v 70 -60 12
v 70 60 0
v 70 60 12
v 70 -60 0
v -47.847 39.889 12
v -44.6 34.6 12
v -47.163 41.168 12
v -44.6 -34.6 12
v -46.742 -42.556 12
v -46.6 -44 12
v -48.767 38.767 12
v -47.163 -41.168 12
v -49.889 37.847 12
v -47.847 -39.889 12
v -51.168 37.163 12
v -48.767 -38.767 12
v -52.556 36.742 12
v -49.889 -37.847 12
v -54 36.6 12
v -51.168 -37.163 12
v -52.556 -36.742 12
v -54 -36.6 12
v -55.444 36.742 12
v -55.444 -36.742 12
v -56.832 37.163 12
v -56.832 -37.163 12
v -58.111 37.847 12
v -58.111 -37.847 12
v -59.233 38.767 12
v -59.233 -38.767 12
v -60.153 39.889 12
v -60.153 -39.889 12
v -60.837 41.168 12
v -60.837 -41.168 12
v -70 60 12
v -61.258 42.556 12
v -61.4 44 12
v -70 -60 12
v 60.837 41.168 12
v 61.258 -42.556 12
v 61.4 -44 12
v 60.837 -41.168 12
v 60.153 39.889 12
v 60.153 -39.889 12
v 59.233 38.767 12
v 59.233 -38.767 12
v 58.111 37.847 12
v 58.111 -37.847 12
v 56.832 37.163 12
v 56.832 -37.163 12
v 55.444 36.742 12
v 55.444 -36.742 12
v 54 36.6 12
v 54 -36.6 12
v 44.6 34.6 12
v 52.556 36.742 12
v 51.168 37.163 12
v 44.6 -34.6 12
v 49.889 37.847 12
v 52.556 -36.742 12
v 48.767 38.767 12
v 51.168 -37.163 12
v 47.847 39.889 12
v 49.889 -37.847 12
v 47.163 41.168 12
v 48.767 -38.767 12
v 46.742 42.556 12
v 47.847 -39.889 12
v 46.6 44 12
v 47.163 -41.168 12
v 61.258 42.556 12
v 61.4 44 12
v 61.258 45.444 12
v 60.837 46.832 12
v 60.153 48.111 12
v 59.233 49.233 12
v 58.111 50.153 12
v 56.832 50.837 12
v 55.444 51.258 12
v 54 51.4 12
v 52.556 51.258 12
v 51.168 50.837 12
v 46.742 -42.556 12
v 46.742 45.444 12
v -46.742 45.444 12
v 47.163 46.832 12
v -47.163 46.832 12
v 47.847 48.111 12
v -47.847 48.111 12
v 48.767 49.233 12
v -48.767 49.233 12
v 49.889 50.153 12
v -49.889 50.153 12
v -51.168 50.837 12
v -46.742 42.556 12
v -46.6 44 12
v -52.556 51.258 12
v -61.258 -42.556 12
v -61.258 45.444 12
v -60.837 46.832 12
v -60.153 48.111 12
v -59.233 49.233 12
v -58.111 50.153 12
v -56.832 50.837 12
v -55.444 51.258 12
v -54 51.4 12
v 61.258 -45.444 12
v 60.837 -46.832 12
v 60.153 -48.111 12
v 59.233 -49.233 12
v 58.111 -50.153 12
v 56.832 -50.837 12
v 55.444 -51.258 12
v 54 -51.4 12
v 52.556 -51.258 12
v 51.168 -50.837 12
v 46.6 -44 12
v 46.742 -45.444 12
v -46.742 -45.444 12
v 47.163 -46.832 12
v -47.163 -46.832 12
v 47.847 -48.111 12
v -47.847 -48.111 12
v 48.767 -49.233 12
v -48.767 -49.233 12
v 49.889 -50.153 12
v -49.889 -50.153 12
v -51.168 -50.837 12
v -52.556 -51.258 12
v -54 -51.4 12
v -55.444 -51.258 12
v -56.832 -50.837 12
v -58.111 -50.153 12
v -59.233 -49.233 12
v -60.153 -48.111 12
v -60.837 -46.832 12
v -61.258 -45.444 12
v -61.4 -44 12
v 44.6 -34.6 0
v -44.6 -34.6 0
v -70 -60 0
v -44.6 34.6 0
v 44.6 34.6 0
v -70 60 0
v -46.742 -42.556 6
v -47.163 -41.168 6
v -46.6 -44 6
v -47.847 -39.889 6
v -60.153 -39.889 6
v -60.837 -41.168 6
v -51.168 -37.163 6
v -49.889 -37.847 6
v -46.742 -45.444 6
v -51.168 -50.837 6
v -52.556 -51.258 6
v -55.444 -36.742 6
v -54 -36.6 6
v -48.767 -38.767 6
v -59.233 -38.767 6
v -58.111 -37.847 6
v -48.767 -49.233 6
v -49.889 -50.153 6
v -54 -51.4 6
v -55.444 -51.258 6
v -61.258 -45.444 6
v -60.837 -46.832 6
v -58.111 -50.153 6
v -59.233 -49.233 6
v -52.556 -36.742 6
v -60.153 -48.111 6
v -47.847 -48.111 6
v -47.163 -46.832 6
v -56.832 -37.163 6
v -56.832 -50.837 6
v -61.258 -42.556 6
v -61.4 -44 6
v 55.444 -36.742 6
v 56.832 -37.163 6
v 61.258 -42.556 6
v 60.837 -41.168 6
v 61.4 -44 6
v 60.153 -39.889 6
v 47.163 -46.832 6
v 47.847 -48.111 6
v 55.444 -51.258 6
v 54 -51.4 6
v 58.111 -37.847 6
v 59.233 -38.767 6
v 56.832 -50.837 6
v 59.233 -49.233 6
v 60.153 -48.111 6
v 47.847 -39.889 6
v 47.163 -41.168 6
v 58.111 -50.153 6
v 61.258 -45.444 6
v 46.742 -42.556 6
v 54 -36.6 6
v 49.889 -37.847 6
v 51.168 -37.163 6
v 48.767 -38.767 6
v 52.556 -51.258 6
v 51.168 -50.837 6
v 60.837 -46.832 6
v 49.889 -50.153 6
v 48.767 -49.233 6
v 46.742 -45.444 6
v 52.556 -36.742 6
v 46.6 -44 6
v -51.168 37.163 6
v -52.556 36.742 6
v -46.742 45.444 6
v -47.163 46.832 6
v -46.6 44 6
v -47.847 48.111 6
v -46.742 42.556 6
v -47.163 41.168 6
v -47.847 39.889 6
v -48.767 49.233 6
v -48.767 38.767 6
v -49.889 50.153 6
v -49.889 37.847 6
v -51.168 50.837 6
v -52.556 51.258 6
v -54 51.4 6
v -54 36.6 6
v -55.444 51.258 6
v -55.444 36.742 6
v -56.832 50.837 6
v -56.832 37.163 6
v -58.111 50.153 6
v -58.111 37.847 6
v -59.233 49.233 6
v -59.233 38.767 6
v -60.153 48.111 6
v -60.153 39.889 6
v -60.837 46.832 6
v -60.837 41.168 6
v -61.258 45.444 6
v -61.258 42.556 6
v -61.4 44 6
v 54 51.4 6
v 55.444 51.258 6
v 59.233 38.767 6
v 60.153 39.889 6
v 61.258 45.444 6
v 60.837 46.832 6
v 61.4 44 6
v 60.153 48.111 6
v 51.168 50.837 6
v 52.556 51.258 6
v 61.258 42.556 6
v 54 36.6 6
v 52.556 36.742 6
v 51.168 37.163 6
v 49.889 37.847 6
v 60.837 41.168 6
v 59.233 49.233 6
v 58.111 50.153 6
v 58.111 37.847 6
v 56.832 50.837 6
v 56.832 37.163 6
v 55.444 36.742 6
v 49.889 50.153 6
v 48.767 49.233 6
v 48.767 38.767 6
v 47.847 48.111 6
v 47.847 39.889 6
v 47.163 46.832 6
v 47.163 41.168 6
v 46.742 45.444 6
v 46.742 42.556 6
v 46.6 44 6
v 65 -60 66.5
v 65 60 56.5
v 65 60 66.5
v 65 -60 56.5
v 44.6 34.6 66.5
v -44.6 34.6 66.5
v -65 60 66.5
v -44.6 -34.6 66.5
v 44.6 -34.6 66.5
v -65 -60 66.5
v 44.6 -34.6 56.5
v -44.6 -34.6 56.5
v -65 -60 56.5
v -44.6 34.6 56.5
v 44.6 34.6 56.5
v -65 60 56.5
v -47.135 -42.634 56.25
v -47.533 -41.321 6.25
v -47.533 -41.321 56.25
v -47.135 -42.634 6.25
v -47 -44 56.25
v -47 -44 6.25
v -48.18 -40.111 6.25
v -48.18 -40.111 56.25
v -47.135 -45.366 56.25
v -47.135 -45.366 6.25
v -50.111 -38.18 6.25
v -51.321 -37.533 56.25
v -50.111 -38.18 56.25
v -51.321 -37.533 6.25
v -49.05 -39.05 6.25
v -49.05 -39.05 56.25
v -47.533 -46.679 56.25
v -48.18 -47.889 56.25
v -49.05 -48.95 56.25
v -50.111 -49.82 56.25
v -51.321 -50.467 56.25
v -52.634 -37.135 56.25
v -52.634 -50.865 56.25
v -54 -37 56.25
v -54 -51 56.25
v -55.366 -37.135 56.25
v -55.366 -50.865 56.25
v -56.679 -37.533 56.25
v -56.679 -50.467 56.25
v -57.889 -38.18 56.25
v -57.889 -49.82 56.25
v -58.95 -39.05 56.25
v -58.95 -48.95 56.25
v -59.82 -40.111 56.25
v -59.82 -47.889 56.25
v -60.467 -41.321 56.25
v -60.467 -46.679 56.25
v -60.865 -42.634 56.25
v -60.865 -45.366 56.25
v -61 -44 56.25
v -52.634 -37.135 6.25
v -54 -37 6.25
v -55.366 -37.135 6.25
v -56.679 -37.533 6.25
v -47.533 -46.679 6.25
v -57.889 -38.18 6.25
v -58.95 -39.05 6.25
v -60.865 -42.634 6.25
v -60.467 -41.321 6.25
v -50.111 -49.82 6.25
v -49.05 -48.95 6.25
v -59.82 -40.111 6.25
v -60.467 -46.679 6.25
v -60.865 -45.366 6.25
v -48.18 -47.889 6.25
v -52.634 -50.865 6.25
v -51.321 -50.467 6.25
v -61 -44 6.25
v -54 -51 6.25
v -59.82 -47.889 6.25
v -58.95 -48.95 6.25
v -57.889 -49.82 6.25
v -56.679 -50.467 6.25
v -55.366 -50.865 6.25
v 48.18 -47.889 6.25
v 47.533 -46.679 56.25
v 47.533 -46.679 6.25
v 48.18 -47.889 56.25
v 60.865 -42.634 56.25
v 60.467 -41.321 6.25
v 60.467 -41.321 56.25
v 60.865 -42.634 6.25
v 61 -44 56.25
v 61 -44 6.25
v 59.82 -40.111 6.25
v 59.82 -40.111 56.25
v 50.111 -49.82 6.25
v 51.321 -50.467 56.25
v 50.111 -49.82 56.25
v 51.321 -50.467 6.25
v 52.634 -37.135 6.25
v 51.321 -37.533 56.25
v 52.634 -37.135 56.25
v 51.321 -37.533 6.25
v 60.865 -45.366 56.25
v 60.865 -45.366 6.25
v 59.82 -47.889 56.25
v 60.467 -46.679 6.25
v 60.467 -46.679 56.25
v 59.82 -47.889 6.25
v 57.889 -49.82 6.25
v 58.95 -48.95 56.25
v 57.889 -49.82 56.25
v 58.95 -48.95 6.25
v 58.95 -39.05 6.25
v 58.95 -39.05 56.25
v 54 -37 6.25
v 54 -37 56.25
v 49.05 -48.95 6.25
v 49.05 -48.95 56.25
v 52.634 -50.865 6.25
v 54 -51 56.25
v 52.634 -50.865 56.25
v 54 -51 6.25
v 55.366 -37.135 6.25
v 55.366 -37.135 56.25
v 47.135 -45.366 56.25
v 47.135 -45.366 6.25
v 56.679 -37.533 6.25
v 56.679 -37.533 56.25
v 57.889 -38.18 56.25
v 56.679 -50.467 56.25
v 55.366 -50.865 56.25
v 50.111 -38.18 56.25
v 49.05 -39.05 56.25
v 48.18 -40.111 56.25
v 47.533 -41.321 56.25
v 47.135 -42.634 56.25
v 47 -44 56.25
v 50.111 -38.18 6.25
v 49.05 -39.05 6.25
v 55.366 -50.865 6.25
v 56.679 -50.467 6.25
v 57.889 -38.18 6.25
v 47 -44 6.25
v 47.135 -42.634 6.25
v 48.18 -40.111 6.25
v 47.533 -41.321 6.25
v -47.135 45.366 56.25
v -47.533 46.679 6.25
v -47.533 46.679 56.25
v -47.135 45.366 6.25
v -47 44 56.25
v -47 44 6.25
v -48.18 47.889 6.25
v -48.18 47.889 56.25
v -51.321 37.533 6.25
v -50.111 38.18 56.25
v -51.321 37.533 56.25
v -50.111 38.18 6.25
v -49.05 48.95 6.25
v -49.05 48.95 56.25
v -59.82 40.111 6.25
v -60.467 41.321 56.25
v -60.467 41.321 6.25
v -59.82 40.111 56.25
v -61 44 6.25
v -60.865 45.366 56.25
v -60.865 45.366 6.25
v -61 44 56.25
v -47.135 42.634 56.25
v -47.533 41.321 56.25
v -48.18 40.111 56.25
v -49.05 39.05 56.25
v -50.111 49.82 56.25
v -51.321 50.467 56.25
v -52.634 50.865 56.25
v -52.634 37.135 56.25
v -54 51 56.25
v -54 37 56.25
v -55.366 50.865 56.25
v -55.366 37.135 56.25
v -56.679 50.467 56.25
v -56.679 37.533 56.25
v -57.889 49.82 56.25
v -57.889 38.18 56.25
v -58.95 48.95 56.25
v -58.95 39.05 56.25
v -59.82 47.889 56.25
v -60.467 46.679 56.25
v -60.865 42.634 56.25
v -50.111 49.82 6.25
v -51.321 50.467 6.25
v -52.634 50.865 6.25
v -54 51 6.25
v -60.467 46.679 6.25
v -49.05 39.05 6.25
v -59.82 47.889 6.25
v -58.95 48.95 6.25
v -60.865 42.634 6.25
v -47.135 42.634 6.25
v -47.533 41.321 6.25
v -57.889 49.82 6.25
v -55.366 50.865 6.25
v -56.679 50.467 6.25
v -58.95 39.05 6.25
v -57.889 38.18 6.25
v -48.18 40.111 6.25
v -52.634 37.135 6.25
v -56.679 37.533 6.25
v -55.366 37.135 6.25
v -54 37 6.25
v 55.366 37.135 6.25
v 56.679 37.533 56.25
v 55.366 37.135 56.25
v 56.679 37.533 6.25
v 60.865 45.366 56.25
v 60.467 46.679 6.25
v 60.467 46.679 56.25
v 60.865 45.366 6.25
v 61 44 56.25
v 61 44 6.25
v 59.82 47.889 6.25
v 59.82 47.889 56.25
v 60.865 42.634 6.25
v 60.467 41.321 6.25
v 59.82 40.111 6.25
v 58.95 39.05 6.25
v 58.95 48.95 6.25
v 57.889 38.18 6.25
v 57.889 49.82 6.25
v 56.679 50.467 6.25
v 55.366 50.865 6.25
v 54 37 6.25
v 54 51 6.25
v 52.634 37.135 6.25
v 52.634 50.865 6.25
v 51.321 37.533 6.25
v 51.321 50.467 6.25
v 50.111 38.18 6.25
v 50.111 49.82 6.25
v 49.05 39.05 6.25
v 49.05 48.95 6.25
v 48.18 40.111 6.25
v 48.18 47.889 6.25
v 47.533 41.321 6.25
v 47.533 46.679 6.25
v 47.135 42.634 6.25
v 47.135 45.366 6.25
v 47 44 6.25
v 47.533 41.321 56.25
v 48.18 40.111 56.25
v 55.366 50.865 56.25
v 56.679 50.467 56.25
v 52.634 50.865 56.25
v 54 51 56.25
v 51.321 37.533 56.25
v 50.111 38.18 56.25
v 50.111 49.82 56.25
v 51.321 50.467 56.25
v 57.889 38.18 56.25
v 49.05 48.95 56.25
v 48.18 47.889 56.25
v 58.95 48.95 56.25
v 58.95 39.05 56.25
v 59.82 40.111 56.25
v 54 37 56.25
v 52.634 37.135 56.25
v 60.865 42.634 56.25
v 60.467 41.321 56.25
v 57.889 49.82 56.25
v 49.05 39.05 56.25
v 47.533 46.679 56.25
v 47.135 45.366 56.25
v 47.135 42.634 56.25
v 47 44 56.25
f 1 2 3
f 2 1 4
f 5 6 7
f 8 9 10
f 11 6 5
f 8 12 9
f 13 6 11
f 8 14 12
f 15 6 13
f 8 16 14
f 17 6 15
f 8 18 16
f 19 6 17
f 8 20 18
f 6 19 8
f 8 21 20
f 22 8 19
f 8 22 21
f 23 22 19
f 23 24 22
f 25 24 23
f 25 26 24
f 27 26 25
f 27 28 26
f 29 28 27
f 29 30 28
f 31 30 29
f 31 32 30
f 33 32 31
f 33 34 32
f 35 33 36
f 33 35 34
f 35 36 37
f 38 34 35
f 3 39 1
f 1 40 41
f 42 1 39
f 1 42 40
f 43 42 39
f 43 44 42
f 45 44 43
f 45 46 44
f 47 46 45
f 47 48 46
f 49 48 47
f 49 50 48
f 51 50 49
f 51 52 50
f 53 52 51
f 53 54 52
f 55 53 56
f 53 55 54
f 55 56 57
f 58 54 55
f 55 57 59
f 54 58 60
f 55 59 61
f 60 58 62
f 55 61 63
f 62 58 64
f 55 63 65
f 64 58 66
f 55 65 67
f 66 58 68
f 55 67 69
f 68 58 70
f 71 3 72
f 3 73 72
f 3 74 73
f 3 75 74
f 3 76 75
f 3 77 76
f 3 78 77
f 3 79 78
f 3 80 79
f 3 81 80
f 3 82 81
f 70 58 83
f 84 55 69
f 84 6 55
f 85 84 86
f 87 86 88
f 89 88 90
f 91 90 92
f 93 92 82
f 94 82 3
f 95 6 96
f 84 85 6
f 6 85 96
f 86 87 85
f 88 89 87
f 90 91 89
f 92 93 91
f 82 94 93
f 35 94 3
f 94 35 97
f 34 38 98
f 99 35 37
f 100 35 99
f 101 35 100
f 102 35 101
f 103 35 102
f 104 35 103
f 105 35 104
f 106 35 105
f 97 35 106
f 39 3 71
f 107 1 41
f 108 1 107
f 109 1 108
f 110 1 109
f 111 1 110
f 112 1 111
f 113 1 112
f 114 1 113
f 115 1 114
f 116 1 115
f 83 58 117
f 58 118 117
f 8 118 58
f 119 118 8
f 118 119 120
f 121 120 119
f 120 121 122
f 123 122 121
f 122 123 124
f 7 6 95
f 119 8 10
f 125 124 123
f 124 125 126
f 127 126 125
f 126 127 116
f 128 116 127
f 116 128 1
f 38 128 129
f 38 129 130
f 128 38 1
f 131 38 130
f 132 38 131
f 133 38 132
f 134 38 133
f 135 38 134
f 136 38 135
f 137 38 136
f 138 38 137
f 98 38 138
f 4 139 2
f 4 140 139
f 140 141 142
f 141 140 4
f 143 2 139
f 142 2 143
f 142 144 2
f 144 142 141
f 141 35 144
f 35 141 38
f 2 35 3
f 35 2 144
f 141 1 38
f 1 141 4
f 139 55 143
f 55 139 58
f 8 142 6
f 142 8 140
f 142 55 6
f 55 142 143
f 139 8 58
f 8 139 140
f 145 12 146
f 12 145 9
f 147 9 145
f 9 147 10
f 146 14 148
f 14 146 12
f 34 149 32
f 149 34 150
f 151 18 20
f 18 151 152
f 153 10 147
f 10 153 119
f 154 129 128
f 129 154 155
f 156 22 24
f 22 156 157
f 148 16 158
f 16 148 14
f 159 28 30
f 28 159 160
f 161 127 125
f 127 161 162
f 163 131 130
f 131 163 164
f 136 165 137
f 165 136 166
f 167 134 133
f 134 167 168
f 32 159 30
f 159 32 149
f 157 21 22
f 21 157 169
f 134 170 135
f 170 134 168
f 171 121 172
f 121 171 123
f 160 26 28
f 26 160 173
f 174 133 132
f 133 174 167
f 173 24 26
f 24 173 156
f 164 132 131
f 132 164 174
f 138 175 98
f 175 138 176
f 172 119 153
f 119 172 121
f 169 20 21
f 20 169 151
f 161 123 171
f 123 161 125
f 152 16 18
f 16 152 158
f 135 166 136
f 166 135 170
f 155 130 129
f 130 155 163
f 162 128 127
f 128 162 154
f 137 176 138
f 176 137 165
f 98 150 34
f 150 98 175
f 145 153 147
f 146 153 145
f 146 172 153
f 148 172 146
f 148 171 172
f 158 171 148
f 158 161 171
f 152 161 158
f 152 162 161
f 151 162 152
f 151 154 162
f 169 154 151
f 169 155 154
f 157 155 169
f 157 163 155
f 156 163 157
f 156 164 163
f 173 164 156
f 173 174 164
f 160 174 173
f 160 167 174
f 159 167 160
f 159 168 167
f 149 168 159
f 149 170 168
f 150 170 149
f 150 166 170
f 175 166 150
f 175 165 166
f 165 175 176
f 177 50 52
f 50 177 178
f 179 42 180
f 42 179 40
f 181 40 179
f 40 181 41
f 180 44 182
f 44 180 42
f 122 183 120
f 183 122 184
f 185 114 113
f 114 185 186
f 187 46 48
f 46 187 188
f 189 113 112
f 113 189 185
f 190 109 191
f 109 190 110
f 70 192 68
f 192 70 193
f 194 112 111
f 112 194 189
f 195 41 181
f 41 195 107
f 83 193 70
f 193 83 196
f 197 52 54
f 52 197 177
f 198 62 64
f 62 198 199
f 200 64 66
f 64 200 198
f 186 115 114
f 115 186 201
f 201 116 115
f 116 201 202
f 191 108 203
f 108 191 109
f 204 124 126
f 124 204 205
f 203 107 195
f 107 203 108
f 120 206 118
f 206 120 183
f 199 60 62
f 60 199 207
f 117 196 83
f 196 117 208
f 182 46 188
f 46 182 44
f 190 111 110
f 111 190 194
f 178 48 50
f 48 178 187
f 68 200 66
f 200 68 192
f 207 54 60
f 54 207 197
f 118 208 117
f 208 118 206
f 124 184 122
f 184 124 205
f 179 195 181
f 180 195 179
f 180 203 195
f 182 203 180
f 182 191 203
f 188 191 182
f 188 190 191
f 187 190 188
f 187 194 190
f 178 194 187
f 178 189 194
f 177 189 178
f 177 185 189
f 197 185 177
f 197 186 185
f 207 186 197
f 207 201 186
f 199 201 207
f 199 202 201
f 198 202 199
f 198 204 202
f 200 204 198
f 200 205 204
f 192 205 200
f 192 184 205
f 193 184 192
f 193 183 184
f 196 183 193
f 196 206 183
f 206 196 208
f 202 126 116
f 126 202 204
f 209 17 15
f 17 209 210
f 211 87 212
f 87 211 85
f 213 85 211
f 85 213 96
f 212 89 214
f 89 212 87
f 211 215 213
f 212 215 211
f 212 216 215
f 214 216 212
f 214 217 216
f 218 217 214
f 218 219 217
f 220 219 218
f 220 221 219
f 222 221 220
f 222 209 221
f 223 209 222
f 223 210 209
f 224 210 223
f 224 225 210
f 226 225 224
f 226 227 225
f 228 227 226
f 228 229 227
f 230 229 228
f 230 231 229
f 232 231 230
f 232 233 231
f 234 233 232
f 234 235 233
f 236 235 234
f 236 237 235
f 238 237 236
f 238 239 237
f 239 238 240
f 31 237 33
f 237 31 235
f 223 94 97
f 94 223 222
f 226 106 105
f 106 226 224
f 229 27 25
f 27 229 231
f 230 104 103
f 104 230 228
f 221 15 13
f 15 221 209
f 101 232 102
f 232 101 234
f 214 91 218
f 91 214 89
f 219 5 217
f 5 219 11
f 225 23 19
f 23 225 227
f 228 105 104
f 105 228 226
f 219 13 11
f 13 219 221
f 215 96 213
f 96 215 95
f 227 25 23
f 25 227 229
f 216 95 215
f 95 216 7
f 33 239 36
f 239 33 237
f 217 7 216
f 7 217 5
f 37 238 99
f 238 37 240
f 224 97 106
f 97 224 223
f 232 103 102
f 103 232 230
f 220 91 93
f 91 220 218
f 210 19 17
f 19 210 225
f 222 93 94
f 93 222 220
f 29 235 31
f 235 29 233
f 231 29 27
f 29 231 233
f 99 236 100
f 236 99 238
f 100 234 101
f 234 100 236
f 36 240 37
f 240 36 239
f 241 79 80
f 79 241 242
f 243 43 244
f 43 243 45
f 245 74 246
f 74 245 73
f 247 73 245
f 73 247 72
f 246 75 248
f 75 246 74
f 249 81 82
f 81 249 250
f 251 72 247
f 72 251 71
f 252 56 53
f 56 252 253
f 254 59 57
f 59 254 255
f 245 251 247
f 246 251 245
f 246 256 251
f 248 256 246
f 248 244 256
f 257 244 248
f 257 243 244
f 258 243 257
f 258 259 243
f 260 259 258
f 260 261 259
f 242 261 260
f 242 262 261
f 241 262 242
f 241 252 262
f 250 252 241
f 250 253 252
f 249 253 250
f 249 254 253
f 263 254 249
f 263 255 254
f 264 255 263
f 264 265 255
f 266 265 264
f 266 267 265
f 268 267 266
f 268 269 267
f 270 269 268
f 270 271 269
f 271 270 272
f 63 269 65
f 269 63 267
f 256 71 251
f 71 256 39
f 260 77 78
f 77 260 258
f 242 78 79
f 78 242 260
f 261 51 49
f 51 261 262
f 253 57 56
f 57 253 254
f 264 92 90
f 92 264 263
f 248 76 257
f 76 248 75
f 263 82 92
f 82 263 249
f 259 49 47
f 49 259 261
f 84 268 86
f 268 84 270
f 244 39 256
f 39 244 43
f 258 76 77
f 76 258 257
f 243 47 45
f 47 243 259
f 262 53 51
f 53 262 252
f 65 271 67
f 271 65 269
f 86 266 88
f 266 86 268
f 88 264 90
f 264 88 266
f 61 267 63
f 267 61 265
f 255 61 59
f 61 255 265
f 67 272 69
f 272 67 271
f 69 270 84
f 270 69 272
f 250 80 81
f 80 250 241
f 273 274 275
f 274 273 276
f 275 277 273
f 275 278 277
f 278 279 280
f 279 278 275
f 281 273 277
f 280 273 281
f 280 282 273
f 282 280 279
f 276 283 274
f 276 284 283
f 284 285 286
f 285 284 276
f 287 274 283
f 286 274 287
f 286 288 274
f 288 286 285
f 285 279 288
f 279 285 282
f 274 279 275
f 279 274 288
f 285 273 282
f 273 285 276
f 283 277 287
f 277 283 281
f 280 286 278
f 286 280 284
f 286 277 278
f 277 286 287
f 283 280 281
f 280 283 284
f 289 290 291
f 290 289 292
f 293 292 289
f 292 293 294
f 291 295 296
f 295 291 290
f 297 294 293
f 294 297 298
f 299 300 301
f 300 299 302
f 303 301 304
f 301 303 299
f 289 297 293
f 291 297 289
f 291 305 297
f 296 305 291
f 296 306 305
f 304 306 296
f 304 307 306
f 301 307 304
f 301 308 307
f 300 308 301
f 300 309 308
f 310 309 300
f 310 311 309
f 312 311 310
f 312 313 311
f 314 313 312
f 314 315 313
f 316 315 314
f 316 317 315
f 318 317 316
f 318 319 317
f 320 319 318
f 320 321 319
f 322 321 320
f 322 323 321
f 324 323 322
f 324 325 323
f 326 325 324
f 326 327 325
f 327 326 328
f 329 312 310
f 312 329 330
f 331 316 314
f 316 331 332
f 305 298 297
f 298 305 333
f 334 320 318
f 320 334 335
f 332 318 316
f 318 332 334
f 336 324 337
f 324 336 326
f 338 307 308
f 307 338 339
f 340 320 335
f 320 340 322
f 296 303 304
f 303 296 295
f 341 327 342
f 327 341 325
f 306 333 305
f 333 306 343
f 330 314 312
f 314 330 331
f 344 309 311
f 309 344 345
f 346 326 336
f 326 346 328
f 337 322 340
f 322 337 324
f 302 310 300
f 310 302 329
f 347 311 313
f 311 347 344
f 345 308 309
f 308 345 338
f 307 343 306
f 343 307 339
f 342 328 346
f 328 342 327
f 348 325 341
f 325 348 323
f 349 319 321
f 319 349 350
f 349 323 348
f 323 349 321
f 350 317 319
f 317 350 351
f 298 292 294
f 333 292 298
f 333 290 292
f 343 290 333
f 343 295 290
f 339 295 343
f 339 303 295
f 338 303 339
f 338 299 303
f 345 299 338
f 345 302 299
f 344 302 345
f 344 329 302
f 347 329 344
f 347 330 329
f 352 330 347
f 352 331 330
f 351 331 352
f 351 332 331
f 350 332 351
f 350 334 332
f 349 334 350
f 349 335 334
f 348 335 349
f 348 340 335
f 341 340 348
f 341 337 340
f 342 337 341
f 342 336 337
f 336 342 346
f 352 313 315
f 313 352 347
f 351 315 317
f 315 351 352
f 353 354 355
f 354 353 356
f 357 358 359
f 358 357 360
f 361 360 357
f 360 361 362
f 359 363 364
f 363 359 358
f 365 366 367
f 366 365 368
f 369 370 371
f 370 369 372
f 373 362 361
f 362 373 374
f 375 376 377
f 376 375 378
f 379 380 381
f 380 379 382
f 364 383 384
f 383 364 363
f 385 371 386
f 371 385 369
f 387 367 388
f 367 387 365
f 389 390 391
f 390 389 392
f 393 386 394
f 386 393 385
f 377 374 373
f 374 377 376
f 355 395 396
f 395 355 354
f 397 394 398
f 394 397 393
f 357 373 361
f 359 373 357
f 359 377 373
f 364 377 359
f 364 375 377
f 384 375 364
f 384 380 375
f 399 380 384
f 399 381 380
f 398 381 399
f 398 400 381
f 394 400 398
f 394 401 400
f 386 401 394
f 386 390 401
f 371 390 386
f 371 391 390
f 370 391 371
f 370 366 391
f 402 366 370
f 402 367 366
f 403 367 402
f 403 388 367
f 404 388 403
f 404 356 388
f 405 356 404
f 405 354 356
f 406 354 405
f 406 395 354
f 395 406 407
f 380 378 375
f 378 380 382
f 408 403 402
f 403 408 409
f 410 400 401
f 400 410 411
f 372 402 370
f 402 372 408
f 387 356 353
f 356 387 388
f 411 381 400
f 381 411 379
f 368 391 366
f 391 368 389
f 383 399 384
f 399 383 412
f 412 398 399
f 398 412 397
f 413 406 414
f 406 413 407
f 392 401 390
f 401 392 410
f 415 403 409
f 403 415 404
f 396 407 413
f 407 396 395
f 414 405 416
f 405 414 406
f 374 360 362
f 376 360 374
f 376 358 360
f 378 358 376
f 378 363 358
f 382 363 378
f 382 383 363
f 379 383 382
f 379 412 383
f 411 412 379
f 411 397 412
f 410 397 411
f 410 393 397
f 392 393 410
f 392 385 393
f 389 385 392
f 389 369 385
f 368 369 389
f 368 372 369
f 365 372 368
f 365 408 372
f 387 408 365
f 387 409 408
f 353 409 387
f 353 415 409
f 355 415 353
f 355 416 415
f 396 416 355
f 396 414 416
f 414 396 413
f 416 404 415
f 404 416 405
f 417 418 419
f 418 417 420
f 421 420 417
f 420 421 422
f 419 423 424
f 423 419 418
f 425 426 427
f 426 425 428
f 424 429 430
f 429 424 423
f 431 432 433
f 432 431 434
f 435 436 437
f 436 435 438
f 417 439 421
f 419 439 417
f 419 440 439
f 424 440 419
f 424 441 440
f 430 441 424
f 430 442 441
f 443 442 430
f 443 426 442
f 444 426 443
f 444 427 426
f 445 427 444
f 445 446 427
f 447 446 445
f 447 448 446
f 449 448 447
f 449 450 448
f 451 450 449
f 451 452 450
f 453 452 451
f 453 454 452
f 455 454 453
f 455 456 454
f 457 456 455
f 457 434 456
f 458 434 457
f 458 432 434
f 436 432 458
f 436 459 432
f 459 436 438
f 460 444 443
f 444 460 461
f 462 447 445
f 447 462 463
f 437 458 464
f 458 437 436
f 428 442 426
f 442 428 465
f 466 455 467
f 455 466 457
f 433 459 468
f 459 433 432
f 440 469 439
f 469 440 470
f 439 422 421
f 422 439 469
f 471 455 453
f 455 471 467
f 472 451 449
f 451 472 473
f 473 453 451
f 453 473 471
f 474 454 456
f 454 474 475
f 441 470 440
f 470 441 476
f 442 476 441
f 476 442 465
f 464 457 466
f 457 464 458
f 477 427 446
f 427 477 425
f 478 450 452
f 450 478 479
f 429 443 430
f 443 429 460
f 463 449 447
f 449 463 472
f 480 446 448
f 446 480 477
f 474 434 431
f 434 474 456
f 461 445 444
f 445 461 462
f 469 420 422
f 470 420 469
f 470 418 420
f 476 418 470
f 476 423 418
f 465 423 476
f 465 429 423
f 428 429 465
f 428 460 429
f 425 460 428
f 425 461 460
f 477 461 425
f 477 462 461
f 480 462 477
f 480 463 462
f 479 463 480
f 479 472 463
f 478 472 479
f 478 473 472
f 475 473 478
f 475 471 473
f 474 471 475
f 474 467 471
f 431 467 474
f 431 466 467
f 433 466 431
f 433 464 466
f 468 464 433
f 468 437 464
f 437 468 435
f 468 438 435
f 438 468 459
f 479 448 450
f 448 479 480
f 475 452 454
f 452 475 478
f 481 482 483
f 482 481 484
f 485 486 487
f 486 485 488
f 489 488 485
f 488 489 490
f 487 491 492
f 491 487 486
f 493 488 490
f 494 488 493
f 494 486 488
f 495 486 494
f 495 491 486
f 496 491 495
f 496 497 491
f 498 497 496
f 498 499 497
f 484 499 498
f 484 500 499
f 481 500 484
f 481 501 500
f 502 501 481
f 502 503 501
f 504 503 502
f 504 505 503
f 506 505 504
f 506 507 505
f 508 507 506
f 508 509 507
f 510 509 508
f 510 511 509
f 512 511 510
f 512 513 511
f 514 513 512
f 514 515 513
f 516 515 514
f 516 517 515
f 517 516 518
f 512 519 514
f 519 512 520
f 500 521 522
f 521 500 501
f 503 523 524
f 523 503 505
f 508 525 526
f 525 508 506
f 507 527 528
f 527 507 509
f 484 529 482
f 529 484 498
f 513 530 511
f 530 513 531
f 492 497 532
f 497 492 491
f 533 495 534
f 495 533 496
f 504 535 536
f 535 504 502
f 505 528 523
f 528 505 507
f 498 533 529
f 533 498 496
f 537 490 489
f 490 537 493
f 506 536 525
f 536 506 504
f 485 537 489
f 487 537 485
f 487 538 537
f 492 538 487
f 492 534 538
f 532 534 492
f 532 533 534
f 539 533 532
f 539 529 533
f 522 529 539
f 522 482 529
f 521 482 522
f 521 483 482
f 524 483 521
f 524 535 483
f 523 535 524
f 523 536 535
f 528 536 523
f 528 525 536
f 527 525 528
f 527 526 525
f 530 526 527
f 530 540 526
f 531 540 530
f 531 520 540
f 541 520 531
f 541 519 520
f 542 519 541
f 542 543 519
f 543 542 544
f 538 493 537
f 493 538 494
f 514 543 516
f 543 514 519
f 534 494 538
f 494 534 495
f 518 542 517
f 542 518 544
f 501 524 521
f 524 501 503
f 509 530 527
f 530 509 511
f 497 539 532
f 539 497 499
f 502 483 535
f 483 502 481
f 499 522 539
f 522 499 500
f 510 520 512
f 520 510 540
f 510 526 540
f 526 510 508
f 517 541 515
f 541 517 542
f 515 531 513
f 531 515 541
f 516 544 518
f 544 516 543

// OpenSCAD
$fn = 32;

// ------------------------------------------------------------------------
// Frame cube: base 140 x 120 mm, posts 50 mm tall
// Every part is its own module, assembly() places every instance.
// ------------------------------------------------------------------------

// --- part 1 ---
module base_frame() {
  difference() {
    translate([-70, -60, 0]) cube([140, 120, 12]);
    translate([-44.6, -34.6, -1]) cube([89.2, 69.2, 14]);
    translate([-54, -44, 6]) cylinder(h = 7, d = 14.8);
    translate([54, -44, 6]) cylinder(h = 7, d = 14.8);
    translate([-54, 44, 6]) cylinder(h = 7, d = 14.8);
    translate([54, 44, 6]) cylinder(h = 7, d = 14.8);
  }
}

// --- part 2 ---
module corner_post() {
  cylinder(h = 50, d = 14);
}

// --- part 3 ---
module top_frame() {
  difference() {
    translate([-65, -60, 0]) cube([130, 120, 10]);
    translate([-44.6, -34.6, -1]) cube([89.2, 69.2, 12]);
  }
}

// --- assembly ---
module assembly() {
  color([0.80, 0.24, 0.20]) translate([0, 0, 0]) rotate([0, 0, 0]) base_frame();
  color([0.20, 0.45, 0.75]) translate([-54, -44, 6.25]) rotate([0, 0, 0]) corner_post();
  color([0.25, 0.62, 0.32]) translate([54, -44, 6.25]) rotate([0, 0, 0]) corner_post();
  color([0.92, 0.70, 0.18]) translate([-54, 44, 6.25]) rotate([0, 0, 0]) corner_post();
  color([0.58, 0.35, 0.70]) translate([54, 44, 6.25]) rotate([0, 0, 0]) corner_post();
  color([0.16, 0.66, 0.66]) translate([0, 0, 56.5]) rotate([0, 0, 0]) top_frame();
}

assembly();
